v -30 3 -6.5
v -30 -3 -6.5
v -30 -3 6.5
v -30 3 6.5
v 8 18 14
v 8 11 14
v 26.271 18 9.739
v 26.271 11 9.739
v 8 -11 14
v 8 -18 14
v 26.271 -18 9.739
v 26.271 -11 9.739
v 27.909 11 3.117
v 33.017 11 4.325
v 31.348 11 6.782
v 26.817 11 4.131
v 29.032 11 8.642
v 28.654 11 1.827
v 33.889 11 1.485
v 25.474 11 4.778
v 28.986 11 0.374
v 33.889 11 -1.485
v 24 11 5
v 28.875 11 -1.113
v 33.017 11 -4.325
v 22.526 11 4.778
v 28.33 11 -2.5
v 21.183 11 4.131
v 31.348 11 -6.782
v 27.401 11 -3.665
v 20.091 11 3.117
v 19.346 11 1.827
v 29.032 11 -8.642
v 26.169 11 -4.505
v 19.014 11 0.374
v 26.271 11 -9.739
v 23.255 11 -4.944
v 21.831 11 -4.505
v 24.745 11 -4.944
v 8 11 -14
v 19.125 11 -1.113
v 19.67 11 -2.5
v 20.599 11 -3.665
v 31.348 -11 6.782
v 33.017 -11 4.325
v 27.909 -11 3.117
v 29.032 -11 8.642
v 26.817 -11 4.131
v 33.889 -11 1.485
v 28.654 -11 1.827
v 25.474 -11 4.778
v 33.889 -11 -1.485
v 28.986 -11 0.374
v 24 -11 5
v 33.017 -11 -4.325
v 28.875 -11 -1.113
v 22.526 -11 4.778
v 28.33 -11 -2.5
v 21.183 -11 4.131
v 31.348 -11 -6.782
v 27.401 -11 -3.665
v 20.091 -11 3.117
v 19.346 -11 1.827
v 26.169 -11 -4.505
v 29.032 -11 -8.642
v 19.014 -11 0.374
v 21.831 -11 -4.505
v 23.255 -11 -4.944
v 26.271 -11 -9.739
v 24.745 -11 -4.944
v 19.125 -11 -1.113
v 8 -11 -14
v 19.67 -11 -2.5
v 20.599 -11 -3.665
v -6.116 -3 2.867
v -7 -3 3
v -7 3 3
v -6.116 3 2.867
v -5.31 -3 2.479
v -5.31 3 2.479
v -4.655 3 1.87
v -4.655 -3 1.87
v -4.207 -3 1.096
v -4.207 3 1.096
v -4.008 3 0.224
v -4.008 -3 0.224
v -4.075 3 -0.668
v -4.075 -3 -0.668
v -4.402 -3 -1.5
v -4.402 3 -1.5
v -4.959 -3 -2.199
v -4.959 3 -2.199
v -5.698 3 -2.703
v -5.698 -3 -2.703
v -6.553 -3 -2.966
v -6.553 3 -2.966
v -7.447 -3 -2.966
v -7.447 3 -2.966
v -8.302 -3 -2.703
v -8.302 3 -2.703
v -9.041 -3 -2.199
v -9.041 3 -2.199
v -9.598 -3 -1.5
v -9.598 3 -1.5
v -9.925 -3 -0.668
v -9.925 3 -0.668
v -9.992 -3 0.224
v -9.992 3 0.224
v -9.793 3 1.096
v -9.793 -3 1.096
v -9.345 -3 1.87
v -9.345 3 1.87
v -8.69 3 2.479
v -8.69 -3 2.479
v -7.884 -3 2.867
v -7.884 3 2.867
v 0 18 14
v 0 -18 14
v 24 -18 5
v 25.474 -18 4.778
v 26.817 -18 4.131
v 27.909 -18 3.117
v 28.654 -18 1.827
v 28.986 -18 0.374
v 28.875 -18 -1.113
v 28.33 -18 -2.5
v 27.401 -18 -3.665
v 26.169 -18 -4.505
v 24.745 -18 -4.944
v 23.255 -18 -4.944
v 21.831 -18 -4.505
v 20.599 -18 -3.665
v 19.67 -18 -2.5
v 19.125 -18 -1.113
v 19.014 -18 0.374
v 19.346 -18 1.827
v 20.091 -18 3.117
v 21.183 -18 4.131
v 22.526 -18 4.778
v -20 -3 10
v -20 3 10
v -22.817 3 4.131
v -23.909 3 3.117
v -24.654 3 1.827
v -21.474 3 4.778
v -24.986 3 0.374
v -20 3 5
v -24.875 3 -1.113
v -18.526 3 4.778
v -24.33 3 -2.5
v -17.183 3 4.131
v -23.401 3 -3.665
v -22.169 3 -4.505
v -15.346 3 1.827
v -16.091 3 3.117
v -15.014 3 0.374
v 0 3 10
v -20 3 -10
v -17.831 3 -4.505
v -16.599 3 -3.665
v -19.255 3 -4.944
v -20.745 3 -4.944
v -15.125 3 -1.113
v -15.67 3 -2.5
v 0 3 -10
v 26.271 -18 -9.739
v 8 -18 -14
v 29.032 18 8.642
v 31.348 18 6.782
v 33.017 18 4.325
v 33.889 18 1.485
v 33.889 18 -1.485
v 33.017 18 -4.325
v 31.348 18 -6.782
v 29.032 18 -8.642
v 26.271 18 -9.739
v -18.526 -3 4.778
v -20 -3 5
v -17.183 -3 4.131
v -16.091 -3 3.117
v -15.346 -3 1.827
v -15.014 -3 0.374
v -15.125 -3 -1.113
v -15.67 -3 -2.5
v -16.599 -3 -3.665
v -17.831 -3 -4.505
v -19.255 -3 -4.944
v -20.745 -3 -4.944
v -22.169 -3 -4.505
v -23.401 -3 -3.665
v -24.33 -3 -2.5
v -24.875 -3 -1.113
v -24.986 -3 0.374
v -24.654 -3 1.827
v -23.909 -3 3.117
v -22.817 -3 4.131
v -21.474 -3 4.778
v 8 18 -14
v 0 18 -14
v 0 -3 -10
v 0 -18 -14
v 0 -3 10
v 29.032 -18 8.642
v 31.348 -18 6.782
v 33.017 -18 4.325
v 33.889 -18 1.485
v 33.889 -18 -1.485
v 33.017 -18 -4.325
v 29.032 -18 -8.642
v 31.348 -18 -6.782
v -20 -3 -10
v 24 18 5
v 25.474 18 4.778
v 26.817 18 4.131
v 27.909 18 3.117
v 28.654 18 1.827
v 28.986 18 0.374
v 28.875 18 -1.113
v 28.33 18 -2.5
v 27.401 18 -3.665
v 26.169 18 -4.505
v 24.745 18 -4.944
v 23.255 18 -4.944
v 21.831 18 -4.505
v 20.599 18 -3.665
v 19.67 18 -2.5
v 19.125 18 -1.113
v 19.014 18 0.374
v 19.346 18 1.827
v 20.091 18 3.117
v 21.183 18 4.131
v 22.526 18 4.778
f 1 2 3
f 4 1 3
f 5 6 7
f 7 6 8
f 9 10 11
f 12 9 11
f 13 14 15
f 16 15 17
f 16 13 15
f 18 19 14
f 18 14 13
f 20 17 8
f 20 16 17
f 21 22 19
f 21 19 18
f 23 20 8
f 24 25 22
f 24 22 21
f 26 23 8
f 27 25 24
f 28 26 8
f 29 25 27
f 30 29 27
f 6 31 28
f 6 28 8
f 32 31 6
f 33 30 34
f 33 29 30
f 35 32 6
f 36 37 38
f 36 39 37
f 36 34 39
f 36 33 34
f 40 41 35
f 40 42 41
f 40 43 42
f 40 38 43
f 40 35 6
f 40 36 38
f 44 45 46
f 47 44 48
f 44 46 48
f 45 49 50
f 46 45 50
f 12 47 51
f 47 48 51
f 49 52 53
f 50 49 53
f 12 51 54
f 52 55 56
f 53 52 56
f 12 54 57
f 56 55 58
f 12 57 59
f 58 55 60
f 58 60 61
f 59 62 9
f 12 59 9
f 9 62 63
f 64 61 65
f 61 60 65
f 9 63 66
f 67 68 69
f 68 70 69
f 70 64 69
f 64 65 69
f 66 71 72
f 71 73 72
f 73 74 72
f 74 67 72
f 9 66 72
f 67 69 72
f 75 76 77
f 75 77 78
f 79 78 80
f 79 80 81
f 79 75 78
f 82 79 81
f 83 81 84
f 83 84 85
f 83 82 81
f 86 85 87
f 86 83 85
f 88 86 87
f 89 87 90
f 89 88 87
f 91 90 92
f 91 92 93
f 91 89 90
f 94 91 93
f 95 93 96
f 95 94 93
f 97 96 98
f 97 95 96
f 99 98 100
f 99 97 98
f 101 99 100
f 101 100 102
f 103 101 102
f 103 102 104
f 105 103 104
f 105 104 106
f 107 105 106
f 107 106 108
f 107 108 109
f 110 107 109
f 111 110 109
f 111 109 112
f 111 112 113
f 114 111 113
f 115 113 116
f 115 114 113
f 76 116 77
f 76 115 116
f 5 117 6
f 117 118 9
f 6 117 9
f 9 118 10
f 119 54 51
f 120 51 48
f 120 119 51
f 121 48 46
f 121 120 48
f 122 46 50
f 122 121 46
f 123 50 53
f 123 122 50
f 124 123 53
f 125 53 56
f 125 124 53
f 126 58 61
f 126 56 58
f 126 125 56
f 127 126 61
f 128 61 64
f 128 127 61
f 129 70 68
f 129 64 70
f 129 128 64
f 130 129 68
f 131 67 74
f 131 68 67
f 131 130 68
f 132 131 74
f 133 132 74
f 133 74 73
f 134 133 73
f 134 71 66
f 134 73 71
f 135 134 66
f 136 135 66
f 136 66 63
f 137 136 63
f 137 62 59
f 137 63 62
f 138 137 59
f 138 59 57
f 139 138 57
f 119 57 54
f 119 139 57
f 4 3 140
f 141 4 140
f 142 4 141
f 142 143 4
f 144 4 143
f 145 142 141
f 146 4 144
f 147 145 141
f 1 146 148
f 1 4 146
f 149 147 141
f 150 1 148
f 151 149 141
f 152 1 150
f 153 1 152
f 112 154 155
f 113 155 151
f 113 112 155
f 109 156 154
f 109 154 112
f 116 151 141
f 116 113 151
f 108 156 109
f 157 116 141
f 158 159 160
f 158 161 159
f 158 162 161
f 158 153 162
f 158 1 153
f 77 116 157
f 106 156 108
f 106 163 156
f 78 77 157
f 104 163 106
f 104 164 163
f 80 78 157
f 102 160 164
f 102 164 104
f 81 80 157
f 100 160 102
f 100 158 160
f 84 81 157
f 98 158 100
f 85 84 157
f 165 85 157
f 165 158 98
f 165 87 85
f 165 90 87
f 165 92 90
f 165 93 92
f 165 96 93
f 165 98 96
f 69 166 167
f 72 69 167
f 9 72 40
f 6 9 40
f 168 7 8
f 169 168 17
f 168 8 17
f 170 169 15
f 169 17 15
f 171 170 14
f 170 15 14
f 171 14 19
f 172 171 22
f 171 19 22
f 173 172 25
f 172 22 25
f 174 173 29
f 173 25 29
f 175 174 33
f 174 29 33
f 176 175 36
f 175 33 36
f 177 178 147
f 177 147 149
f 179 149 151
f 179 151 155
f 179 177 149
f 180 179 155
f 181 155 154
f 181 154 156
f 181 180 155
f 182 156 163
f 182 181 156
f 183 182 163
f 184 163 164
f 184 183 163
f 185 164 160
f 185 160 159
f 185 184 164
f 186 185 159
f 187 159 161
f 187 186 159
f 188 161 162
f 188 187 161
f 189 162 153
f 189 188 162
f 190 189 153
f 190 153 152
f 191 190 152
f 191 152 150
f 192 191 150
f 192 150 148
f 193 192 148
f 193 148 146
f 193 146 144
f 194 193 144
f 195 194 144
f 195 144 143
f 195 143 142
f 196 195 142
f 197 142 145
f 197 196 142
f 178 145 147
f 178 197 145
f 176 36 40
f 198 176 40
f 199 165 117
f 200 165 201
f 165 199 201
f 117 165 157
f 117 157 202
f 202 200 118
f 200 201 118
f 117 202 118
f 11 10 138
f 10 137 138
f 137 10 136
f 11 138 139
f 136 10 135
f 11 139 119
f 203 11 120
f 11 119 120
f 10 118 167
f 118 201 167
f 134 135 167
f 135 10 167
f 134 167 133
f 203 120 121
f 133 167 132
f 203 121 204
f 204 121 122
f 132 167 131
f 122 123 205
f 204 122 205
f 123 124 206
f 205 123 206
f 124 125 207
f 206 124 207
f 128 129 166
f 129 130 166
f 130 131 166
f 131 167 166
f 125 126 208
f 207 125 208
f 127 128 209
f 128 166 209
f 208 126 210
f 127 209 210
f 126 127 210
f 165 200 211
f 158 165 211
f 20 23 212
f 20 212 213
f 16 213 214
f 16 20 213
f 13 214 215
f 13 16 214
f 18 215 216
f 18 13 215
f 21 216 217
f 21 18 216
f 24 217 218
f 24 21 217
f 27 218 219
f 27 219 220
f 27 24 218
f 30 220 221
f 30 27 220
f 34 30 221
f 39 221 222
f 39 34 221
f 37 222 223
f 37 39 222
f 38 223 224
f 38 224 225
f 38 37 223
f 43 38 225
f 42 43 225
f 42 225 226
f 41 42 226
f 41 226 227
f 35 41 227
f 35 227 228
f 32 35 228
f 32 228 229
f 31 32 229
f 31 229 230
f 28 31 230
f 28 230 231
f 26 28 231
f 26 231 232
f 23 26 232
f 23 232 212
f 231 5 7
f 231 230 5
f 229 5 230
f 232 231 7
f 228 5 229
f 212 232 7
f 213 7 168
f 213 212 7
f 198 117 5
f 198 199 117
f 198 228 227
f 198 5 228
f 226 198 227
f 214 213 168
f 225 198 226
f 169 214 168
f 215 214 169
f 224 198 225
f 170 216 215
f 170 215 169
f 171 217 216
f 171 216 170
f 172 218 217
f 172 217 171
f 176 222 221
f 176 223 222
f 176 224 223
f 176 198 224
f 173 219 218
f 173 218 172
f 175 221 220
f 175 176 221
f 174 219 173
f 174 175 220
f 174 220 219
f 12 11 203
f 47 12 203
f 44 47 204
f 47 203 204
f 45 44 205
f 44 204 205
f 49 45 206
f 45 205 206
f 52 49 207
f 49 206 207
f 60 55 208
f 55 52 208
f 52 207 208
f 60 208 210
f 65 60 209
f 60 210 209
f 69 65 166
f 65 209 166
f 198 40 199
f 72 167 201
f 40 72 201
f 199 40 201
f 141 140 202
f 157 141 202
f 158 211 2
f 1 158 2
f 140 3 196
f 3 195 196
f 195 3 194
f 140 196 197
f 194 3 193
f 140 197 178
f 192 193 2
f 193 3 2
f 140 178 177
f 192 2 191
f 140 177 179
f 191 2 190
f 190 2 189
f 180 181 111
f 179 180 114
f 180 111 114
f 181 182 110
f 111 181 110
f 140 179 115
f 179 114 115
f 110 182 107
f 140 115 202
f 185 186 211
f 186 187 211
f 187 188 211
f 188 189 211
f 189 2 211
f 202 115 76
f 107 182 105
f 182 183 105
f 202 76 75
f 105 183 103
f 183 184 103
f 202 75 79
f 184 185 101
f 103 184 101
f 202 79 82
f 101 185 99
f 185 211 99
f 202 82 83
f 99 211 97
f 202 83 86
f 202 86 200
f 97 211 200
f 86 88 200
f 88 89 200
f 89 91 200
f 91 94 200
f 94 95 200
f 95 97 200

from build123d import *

# Parameters (mm, degrees)
BOSS_EXTRUDE3_DEPTH      = 18
BOSS_EXTRUDE3_DEPTH_BACK = 18
SKETCH1_R                = 5
BOSS_EXTRUDE4_DEPTH      = 3
BOSS_EXTRUDE4_DEPTH_BACK = 3
SKETCH1_5_R              = 5
SKETCH1_5_R_2            = 3
SKETCH3_W                = 40.653147646
SKETCH3_H                = 22
CUT_EXTRUDE2_DEPTH       = 48.581509013


with BuildPart() as part:
    # Sketch1 → Boss-Extrude3 (new, two sides: drawn at the far end of the back side and taken through both)
    with BuildSketch(Plane(origin=(0, 0, 0), x_dir=(1, 0, 0), z_dir=(0, 1, 0)).offset(-BOSS_EXTRUDE3_DEPTH_BACK)):
        with BuildLine():
            Line((0, 10), (0, -10))
            Line((0, -10), (0, -14))
            Line((0, -14), (8, -14))
            Line((8, -14), (26.271311561, -9.738641784))
            ThreePointArc((26.271311561, -9.738641784), (34, 0), (26.271311561, 9.738641784))
            Line((26.271311561, 9.738641784), (8, 14))
            Line((8, 14), (0, 14))
            Line((0, 14), (0, 10))
        make_face()
        with Locations((24, 0)):
            Circle(SKETCH1_R, mode=Mode.SUBTRACT)
    extrude(amount=BOSS_EXTRUDE3_DEPTH + BOSS_EXTRUDE3_DEPTH_BACK)

    # Sketch1<5> → Boss-Extrude4 (add, two sides: drawn at the far end of the back side and taken through both)
    with BuildSketch(Plane(origin=(0, 0, 0), x_dir=(1, 0, 0), z_dir=(0, 1, 0)).offset(-BOSS_EXTRUDE4_DEPTH_BACK)):
        Polygon((-30, 6.5), (-30, -6.5), (-20, -10), (0, -10), (0, 10), (-20, 10), align=None)
        with Locations((-20, 0)):
            Circle(SKETCH1_5_R, mode=Mode.SUBTRACT)
        with Locations((-7, 0)):
            Circle(SKETCH1_5_R_2, mode=Mode.SUBTRACT)
    extrude(amount=BOSS_EXTRUDE4_DEPTH + BOSS_EXTRUDE4_DEPTH_BACK)

    # Sketch3 → Cut-Extrude2 (cut, through all)
    with BuildSketch(Plane(origin=(0, 0, -14), x_dir=(-1, 0, 0), z_dir=(0, 0, -1))):
        with Locations((-28.326573823, 0)):
            Rectangle(SKETCH3_W, SKETCH3_H)
    extrude(amount=-CUT_EXTRUDE2_DEPTH, mode=Mode.SUBTRACT)


solid = part.part
